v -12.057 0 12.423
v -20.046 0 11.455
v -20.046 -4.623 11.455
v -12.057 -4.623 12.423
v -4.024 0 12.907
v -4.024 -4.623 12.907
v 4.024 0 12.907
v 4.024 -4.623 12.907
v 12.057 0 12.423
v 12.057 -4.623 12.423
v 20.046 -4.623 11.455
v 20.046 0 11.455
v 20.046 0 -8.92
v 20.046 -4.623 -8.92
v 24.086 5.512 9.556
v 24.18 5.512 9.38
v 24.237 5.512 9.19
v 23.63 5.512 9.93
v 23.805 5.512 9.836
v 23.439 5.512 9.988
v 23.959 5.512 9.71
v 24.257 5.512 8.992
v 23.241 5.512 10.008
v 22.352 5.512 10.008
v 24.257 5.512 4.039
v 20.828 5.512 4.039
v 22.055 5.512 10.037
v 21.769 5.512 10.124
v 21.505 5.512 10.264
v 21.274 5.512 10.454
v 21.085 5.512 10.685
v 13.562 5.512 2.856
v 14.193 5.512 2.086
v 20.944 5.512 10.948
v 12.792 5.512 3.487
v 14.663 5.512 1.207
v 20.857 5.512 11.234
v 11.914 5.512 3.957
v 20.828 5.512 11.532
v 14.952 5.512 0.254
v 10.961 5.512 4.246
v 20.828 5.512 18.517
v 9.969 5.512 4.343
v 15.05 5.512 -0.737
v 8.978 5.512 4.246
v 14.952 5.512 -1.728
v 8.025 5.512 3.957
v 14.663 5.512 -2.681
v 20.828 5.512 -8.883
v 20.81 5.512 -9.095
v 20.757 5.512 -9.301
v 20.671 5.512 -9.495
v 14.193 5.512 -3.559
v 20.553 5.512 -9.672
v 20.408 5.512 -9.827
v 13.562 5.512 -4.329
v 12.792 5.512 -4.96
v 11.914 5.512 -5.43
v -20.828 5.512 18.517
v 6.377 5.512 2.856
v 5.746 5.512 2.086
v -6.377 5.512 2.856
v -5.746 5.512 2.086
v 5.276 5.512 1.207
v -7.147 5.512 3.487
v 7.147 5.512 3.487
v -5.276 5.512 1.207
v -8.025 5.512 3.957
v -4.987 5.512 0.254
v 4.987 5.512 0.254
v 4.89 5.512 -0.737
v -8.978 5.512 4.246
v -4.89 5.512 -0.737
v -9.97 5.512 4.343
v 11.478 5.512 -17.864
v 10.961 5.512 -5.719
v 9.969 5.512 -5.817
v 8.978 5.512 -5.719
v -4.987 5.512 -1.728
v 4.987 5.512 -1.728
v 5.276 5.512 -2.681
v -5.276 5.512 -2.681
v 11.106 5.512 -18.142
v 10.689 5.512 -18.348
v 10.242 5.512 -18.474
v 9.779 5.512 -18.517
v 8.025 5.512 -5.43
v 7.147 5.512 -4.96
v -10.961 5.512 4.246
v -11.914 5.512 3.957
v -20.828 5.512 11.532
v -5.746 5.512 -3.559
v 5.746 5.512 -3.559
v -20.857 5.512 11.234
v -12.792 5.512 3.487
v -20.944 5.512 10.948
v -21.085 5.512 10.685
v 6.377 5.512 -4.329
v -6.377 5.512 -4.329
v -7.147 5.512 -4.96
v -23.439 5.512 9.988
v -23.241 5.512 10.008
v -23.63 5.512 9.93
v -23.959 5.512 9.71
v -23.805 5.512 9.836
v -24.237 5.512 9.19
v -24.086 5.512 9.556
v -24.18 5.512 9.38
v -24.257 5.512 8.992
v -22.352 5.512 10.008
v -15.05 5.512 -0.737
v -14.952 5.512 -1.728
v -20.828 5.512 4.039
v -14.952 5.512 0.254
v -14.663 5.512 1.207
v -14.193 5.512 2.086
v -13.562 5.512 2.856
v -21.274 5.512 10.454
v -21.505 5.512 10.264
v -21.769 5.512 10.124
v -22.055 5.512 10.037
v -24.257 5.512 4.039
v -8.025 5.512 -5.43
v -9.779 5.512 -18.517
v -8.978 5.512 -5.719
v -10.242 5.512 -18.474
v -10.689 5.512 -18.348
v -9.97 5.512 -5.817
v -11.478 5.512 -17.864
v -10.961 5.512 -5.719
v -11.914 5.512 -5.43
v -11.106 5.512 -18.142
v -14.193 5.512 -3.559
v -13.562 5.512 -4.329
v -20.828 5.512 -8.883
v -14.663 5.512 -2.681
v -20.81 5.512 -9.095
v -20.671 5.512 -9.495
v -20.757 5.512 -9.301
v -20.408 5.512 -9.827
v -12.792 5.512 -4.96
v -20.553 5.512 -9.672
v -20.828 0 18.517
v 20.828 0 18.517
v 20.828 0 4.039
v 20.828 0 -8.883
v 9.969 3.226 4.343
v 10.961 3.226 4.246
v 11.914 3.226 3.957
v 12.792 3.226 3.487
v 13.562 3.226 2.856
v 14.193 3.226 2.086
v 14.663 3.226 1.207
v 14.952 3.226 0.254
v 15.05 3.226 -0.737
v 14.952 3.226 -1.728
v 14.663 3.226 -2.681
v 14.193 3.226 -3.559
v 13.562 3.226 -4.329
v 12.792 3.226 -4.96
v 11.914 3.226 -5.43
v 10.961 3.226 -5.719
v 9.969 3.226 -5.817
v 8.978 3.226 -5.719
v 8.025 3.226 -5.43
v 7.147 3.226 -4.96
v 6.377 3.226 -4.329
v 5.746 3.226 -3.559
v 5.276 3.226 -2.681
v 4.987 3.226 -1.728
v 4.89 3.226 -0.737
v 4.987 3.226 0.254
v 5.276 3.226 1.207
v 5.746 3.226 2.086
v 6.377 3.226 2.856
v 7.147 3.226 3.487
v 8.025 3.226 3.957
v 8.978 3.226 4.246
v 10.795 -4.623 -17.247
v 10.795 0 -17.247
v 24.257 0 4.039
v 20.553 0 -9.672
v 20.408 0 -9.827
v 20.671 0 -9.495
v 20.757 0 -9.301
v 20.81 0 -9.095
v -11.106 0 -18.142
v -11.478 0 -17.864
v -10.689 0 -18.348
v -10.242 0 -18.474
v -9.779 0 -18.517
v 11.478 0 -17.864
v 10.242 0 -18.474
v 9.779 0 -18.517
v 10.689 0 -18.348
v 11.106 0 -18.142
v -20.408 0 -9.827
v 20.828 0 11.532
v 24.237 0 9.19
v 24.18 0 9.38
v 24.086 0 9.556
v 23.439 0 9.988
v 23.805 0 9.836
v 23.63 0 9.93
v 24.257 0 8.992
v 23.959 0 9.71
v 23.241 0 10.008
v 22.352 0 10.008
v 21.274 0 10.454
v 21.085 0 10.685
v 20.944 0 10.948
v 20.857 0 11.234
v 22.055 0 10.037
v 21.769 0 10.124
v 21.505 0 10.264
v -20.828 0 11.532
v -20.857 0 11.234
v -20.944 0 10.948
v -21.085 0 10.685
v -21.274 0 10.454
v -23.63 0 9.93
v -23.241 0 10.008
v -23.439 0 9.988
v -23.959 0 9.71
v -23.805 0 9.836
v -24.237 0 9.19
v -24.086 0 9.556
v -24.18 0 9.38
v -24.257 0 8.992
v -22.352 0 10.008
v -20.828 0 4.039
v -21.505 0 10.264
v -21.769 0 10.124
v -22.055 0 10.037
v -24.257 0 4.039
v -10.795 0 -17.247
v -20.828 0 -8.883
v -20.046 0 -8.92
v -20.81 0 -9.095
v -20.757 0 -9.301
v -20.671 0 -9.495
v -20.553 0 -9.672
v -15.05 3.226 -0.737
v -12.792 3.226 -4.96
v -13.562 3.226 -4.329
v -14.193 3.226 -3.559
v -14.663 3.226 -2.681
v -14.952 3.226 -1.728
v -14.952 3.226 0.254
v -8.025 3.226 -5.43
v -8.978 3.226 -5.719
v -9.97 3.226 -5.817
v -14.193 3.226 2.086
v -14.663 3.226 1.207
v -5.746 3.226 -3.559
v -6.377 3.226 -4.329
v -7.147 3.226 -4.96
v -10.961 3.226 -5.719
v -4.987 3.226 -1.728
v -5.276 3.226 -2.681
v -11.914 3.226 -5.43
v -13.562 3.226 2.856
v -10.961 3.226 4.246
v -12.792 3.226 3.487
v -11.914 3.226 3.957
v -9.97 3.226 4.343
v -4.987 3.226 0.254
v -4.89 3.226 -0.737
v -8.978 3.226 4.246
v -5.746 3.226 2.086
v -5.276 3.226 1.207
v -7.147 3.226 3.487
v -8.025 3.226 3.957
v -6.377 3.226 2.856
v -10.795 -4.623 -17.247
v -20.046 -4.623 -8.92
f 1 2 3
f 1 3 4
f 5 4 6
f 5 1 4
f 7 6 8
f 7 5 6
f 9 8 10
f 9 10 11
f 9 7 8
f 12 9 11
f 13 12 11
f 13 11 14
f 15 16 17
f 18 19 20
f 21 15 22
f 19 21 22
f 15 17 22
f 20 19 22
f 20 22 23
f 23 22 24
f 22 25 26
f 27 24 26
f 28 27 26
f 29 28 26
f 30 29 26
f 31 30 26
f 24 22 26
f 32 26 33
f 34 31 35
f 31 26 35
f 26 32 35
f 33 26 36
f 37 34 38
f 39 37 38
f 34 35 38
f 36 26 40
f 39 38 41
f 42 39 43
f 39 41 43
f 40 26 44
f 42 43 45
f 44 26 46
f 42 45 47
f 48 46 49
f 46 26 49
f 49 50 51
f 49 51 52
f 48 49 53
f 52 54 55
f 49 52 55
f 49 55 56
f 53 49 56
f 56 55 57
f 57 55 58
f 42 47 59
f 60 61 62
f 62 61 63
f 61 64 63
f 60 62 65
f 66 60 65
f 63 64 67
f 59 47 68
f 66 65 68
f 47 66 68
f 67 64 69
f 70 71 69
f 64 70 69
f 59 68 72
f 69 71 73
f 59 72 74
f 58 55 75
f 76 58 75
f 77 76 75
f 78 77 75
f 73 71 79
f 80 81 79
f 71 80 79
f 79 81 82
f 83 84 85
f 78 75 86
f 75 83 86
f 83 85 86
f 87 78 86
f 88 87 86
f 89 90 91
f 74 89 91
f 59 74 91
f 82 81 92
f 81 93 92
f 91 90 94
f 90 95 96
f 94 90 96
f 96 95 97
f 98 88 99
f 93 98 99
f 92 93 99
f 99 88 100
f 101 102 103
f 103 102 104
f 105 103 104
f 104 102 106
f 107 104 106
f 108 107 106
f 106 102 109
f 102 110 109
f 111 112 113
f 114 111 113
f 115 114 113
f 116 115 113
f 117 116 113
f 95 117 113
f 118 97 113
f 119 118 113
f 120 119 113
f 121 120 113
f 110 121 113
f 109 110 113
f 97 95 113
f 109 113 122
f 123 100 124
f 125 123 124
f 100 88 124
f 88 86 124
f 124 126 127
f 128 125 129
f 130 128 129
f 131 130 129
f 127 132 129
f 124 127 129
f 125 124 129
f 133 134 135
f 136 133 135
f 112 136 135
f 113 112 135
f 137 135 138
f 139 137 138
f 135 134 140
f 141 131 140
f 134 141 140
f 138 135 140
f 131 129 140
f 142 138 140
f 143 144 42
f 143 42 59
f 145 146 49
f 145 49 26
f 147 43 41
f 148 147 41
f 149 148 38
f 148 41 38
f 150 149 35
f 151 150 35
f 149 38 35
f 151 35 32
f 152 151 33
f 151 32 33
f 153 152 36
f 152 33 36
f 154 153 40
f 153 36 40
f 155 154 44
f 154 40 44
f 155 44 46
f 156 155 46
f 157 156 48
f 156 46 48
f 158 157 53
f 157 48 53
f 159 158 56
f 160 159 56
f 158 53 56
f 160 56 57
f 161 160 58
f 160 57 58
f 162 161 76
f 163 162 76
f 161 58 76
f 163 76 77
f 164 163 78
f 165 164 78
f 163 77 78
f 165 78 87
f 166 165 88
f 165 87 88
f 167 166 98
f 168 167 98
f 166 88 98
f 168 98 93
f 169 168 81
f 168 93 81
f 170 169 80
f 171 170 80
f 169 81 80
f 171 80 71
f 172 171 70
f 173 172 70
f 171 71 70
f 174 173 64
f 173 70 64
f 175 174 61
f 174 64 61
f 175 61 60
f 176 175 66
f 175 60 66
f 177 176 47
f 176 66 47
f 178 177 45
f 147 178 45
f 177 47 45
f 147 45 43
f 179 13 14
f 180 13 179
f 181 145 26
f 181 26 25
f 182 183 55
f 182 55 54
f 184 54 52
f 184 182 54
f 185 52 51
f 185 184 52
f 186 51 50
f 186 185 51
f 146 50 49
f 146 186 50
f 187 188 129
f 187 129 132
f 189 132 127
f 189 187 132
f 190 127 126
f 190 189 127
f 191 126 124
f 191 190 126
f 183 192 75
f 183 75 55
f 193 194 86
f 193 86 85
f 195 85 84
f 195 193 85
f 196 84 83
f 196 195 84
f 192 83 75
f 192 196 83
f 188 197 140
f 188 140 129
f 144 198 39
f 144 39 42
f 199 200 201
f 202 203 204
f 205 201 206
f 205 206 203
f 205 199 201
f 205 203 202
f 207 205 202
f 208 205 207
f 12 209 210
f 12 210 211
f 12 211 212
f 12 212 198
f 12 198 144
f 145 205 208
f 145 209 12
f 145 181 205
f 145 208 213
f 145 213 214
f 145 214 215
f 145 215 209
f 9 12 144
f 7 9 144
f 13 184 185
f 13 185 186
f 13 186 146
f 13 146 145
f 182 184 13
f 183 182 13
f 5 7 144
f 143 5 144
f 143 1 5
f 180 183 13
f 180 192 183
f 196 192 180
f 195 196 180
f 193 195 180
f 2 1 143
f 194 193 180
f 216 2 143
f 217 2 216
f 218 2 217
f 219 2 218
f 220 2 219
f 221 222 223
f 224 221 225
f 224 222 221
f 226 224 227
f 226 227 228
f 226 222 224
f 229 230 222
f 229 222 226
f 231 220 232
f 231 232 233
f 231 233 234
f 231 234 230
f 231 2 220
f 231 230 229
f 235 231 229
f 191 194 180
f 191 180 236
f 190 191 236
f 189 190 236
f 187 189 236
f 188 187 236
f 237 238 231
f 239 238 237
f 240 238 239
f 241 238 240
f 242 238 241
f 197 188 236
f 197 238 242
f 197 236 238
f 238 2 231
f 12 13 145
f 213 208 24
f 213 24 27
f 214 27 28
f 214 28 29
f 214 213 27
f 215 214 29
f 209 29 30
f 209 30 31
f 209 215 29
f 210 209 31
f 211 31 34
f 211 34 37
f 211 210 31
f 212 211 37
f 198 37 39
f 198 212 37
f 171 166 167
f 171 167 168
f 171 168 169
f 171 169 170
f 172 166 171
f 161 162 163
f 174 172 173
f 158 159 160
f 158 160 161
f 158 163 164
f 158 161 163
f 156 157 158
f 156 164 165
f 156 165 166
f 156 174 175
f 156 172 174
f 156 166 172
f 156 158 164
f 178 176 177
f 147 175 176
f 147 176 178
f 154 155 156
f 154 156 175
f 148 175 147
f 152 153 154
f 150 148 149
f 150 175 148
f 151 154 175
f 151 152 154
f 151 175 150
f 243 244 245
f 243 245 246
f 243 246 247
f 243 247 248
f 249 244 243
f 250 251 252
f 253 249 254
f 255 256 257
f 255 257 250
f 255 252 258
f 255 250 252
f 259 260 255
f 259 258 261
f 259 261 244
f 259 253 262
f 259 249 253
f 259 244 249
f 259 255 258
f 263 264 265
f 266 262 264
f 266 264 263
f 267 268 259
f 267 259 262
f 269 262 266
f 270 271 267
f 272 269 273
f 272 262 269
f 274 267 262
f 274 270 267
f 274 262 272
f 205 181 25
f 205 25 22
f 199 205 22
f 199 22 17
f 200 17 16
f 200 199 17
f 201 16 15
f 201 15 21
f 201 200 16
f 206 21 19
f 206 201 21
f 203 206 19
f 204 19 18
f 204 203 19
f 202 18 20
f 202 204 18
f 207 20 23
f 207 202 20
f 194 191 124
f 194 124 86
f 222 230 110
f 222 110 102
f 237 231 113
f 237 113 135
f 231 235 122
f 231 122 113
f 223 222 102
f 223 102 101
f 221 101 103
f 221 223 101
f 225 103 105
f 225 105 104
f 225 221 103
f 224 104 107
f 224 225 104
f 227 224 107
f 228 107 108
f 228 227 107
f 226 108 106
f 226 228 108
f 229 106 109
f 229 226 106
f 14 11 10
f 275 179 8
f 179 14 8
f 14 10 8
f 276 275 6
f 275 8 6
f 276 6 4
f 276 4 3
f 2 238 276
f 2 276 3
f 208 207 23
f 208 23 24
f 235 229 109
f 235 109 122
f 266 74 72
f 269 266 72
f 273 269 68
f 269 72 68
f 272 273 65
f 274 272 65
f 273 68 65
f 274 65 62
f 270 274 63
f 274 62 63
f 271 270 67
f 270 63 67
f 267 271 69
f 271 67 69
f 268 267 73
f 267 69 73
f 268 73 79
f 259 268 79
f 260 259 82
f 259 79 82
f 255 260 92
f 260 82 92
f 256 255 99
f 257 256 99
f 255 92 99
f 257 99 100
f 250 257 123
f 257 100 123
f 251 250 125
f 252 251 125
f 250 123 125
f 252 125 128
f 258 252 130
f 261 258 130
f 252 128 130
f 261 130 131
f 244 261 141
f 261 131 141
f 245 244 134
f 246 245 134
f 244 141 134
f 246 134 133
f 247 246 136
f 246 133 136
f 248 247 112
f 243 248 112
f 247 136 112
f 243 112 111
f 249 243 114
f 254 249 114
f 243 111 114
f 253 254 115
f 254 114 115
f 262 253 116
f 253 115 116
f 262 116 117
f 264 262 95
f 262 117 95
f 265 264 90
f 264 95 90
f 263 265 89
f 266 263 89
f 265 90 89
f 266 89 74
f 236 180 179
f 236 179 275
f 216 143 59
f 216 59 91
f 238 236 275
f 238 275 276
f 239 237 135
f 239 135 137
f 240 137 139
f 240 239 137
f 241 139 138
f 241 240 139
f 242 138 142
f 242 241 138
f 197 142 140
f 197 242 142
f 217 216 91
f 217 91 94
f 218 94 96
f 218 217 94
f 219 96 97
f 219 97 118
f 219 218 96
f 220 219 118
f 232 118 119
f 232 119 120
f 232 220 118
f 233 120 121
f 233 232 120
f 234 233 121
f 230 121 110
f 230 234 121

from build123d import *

# Parameters (mm, degrees)
BOSS_EXTRUDE1_DEPTH = 5.5118
SKETCH2_R           = 5.08
CUT_EXTRUDE1_DEPTH  = 2.286
BOSS_EXTRUDE2_DEPTH = 4.6228


with BuildPart() as part:
    # Sketch1 → Boss-Extrude1 (new body)
    with BuildSketch(Plane(origin=(0, 0, 0), x_dir=(1, 0, 0), z_dir=(0, 1, 0))):
        with BuildLine():
            ThreePointArc((20.407631134, 9.827266142), (20.718157649, 9.399980692), (20.828, 8.88332391))
            Line((20.828, 8.88332391), (20.828, -4.0386))
            Line((20.828, -4.0386), (24.257, -4.0386))
            Line((24.257, -4.0386), (24.257, -8.9916))
            ThreePointArc((24.257, -8.9916), (23.95942049, -9.71002049), (23.241, -10.0076))
            Line((23.241, -10.0076), (22.352, -10.0076))
            ThreePointArc((22.352, -10.0076), (21.274369265, -10.453969265), (20.828, -11.5316))
            Line((20.828, -11.5316), (20.828, -18.5166))
            Line((20.828, -18.5166), (-20.828, -18.5166))
            Line((-20.828, -18.5166), (-20.828, -11.5316))
            ThreePointArc((-20.828, -11.5316), (-21.274369265, -10.453969265), (-22.352, -10.0076))
            Line((-22.352, -10.0076), (-23.241, -10.0076))
            ThreePointArc((-23.241, -10.0076), (-23.95942049, -9.71002049), (-24.257, -8.9916))
            Line((-24.257, -8.9916), (-24.257, -4.0386))
            Line((-24.257, -4.0386), (-20.828, -4.0386))
            Line((-20.828, -4.0386), (-20.828, 8.88332391))
            ThreePointArc((-20.828, 8.88332391), (-20.718157649, 9.399980692), (-20.407631134, 9.827266142))
            Line((-20.407631134, 9.827266142), (-11.478262268, 17.864484463))
            ThreePointArc((-11.478262268, 17.864484463), (-10.689047654, 18.347973709), (-9.779, 18.5166))
            Line((-9.779, 18.5166), (9.779, 18.5166))
            ThreePointArc((9.779, 18.5166), (10.689047654, 18.347973709), (11.478262268, 17.864484463))
            Line((11.478262268, 17.864484463), (20.407631134, 9.827266142))
        make_face()
    extrude(amount=BOSS_EXTRUDE1_DEPTH)

    # Sketch2 → Cut-Extrude1 (cut)
    with BuildSketch(Plane(origin=(0, 5.5118, 0), x_dir=(1, 0, 0), z_dir=(0, 1, 0))):
        with Locations(Location((-9.9695, 0.7366, 0), (0, 0, 270))):
            Circle(SKETCH2_R)
        with Locations(Location((9.9695, 0.7366, 0), (0, 0, 270))):
            Circle(SKETCH2_R)
    extrude(amount=-CUT_EXTRUDE1_DEPTH, mode=Mode.SUBTRACT)

    # Sketch3 → Boss-Extrude2 (add)
    with BuildSketch(Plane.XZ):
        with BuildLine():
            Line((10.795, -17.2466), (-10.795, -17.2466))
            Line((-10.795, -17.2466), (-20.045633867, -8.920214887))
            Line((-20.045633867, -8.920214887), (-20.045633867, 11.4554))
            ThreePointArc((-20.045633867, 11.4554), (0, 12.967759921), (20.045633867, 11.4554))
            Line((20.045633867, 11.4554), (20.045633867, -8.920214887))
            Line((20.045633867, -8.920214887), (10.795, -17.2466))
        make_face()
    extrude(amount=BOSS_EXTRUDE2_DEPTH)


solid = part.part
